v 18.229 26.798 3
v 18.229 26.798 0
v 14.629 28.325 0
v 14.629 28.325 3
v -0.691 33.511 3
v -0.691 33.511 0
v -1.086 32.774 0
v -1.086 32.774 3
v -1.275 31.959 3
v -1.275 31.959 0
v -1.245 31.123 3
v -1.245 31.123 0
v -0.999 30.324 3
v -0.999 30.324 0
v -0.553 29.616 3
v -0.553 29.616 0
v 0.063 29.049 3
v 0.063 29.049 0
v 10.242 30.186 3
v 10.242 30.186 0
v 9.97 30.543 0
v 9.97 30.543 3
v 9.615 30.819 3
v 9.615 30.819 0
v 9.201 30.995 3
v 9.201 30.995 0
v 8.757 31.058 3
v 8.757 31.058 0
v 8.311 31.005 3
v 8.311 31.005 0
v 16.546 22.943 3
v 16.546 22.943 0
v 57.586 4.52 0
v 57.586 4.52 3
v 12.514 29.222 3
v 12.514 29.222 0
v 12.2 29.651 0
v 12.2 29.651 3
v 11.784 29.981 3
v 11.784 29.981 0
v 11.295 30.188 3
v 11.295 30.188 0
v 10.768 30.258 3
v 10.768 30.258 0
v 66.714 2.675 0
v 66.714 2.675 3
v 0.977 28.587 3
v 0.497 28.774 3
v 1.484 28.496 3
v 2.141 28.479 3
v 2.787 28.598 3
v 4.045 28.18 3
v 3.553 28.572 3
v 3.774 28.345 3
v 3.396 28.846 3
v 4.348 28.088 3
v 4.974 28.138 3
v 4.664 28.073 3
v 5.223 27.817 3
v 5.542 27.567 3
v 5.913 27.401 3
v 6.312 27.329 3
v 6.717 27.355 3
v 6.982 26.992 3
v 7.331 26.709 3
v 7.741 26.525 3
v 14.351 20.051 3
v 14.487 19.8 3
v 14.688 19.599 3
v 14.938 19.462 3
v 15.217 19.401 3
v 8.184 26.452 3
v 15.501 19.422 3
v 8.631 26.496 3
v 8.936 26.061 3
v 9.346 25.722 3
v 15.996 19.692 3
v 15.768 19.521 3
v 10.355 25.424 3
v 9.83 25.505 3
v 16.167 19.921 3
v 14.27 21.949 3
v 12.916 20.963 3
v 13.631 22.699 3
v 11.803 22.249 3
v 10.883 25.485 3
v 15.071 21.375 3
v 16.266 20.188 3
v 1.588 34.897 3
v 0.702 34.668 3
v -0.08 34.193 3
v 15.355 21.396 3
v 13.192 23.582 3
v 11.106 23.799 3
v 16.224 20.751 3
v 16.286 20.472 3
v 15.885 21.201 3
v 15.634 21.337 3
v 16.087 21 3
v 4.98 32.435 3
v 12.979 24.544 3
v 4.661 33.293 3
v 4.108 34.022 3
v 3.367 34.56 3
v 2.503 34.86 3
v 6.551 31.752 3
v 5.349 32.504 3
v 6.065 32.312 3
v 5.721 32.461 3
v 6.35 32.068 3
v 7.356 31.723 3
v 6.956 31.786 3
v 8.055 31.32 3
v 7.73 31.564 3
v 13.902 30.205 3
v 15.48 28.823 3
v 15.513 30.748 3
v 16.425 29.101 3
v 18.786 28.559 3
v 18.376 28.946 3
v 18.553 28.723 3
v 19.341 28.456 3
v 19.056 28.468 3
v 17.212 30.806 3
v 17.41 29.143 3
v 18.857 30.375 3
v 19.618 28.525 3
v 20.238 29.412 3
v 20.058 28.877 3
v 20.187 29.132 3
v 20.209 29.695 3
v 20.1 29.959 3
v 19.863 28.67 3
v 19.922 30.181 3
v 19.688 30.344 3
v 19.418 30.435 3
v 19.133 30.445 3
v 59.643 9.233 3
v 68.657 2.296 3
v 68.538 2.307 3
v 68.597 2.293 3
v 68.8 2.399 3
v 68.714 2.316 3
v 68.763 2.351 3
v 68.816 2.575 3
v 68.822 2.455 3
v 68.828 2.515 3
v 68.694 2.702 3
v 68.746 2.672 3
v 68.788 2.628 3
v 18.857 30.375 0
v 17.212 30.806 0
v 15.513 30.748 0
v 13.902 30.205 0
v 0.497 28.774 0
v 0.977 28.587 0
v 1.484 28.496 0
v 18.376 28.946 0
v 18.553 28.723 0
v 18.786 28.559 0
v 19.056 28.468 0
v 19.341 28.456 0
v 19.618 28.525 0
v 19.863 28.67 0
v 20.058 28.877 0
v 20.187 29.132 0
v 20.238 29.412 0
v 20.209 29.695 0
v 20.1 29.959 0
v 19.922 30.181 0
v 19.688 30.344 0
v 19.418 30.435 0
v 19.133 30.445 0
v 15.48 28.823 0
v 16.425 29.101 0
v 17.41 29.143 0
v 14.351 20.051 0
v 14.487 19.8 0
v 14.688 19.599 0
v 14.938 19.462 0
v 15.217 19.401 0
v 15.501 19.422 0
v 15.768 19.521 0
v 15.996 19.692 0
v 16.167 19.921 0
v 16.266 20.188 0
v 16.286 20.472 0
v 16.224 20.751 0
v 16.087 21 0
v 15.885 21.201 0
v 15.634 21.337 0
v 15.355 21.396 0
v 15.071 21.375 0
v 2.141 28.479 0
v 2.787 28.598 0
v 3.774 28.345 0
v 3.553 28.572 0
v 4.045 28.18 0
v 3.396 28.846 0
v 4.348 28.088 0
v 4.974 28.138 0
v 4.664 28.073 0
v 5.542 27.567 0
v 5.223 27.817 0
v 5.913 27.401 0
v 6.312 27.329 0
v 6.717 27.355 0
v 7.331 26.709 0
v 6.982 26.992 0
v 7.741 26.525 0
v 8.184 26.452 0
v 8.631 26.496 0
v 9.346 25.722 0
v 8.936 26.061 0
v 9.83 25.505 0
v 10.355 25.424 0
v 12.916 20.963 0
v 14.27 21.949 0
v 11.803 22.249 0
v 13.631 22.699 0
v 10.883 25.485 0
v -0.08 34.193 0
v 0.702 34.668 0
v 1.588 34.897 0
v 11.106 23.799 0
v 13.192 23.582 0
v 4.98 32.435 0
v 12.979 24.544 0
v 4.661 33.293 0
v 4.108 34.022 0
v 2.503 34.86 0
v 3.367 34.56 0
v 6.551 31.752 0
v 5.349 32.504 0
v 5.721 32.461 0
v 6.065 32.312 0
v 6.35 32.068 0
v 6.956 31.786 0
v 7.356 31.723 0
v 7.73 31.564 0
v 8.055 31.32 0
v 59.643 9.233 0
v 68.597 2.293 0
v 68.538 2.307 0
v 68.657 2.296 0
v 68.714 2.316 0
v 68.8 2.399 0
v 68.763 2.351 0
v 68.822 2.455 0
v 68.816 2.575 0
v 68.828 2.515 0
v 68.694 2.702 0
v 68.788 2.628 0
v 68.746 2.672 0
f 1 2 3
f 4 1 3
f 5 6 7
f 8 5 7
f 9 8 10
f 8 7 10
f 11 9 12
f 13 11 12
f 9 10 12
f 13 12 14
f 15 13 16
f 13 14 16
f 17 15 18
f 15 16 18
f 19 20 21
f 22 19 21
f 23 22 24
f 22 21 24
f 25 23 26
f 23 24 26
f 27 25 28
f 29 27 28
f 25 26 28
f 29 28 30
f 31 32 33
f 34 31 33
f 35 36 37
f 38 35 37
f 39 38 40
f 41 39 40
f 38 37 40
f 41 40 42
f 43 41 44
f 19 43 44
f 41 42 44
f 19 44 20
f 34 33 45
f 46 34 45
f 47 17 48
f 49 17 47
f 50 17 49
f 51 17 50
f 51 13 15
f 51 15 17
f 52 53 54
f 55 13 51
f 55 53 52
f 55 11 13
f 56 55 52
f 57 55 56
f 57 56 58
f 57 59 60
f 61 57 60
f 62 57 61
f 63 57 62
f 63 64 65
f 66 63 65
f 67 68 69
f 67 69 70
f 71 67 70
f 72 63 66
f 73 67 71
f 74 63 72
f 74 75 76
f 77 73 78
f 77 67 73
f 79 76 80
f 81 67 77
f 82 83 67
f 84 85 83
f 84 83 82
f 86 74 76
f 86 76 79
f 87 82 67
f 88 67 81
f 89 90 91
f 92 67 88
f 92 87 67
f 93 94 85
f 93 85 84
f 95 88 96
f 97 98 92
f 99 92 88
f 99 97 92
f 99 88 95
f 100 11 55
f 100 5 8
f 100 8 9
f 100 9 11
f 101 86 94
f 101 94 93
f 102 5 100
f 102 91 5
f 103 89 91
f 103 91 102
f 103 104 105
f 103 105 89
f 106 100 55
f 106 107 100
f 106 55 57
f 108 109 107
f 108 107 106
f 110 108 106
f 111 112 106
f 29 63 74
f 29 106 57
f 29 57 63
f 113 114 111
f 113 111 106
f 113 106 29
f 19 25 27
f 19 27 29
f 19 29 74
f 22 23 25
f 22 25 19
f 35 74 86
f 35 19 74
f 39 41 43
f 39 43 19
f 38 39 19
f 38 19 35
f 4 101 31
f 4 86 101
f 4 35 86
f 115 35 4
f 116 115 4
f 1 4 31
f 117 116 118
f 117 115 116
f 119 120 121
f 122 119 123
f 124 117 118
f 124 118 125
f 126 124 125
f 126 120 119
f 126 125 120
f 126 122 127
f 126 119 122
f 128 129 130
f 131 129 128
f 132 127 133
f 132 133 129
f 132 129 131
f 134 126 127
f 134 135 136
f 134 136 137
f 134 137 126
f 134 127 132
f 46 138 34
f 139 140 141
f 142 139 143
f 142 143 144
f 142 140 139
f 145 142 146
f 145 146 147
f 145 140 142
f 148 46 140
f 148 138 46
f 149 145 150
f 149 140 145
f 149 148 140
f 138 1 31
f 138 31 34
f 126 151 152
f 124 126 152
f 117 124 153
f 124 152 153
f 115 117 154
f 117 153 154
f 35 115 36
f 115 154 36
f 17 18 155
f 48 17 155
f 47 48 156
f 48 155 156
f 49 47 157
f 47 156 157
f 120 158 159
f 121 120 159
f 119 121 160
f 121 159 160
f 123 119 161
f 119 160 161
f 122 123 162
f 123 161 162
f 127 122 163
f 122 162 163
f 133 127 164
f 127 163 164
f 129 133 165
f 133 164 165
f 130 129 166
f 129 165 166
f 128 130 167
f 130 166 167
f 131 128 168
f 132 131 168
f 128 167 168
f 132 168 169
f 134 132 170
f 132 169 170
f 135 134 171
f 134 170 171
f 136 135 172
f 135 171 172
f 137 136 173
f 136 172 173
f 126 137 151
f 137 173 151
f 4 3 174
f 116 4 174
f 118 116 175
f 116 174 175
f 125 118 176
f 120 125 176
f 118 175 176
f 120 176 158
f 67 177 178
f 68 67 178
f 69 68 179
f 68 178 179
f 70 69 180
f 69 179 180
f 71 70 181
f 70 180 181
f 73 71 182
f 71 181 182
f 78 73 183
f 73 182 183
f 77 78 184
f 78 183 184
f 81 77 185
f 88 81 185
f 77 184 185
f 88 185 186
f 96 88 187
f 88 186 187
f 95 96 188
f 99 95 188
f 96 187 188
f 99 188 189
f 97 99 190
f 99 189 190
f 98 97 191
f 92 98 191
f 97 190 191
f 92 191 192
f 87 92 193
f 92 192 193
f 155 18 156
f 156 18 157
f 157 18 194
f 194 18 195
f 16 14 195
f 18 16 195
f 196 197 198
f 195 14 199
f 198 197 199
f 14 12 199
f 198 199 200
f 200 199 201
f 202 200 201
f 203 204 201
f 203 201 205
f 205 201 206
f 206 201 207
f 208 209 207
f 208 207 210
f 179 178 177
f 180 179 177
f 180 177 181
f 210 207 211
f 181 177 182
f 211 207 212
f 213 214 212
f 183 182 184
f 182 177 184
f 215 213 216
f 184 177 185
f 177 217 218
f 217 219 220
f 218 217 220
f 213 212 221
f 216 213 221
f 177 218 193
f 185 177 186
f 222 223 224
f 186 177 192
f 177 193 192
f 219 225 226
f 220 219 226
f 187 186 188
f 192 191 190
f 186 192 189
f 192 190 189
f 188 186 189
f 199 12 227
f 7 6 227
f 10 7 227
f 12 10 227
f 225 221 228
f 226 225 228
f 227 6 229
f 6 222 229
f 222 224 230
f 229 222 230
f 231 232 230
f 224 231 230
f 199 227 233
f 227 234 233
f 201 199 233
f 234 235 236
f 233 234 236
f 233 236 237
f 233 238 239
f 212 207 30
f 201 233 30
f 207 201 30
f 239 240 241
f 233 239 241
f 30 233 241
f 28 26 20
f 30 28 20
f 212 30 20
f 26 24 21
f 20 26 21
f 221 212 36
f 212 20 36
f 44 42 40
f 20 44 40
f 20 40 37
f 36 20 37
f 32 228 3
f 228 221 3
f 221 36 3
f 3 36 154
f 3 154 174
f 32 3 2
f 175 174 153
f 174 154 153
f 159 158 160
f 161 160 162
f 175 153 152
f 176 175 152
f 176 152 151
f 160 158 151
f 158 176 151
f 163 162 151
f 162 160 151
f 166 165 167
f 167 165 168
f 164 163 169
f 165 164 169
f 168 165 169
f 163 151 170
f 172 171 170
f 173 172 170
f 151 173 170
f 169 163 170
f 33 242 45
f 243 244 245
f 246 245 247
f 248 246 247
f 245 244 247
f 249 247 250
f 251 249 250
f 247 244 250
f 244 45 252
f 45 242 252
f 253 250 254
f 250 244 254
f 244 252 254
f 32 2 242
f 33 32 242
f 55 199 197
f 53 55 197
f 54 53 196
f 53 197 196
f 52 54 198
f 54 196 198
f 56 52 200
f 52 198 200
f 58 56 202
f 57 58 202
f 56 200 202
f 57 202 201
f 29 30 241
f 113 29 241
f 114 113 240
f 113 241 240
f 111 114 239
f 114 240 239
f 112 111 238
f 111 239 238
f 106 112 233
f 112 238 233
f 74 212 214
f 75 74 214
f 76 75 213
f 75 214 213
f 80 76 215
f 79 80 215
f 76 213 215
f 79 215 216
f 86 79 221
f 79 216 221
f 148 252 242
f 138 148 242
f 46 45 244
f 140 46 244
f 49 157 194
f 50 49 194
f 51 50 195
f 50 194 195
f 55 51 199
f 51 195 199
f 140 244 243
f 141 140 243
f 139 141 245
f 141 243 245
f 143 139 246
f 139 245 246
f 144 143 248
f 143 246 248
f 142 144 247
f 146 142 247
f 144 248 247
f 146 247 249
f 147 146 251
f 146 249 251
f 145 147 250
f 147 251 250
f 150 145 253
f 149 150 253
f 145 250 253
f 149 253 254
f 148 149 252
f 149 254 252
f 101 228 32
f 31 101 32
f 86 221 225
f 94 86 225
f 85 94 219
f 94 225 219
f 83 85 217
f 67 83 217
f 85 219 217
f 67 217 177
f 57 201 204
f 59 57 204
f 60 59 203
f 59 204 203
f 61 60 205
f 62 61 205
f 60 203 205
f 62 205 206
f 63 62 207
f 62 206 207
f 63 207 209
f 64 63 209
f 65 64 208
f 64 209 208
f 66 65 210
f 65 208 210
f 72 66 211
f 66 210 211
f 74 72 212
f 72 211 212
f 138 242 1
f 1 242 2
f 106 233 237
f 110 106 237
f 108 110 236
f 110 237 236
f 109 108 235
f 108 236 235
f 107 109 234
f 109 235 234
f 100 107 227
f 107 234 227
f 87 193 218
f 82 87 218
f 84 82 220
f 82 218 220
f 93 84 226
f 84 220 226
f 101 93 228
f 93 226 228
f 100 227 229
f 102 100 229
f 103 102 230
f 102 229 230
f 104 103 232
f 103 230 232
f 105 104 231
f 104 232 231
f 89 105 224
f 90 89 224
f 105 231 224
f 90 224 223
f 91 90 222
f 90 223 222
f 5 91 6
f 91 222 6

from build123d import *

# Parameters (mm, degrees)
SALIENTE_EXTRUIR1_DEPTH = 3


with BuildPart() as part:
    # Model → Saliente-Extruir1 (new body)
    with BuildSketch(Plane.XY):
        with BuildLine():
            Line((66.714016933, 2.675368226), (68.538077011, 2.306726339))
            ThreePointArc((68.538077011, 2.306726339), (68.813397969, 2.426362589), (68.69376172, 2.701683548))
            Line((68.69376172, 2.701683548), (59.642778757, 9.23296694))
            Line((59.642778757, 9.23296694), (18.229236322, 26.798350869))
            Line((18.229236322, 26.798350869), (14.628932536, 28.325404932))
            ThreePointArc((14.628932536, 28.325404932), (16.425259576, 29.101436048), (18.375877707, 28.946181294))
            ThreePointArc((18.375877707, 28.946181294), (20.18694444, 29.13171328), (18.856885424, 30.37482544))
            ThreePointArc((18.856885424, 30.37482544), (15.51300149, 30.748167733), (12.514190479, 29.22236409))
            ThreePointArc((12.514190479, 29.22236409), (11.546461676, 30.101035899), (10.242109559, 30.186057881))
            ThreePointArc((10.242109559, 30.186057881), (9.413998041, 30.920271825), (8.310546545, 31.005322399))
            ThreePointArc((8.310546545, 31.005322399), (7.548095898, 31.654909282), (6.551125432, 31.751573638))
            ThreePointArc((6.551125432, 31.751573638), (5.898852104, 32.399314767), (4.980282277, 32.434790623))
            ThreePointArc((4.980282277, 32.434790623), (2.50269425, 34.859987429), (-0.691279819, 33.511450585))
            ThreePointArc((-0.691279819, 33.511450585), (-1.245238827, 31.123095112), (0.062521474, 29.0492399))
            ThreePointArc((0.062521474, 29.0492399), (0.732684306, 28.668767636), (1.483760549, 28.496251432))
            ThreePointArc((1.483760549, 28.496251432), (2.467023265, 28.521711274), (3.395589179, 28.846086231))
            ThreePointArc((3.395589179, 28.846086231), (4.04475241, 28.180155342), (4.973767828, 28.137644119))
            ThreePointArc((4.973767828, 28.137644119), (5.722549371, 27.472346961), (6.71729481, 27.354977378))
            ThreePointArc((6.71729481, 27.354977378), (7.529963713, 26.603706418), (8.63140861, 26.495734463))
            ThreePointArc((8.63140861, 26.495734463), (9.580661475, 25.59713434), (10.88296417, 25.485014428))
            ThreePointArc((10.88296417, 25.485014428), (11.803253278, 22.248656569), (14.350721609, 20.050623508))
            ThreePointArc((14.350721609, 20.050623508), (16.16662002, 19.920632003), (15.071202926, 21.374745554))
            ThreePointArc((15.071202926, 21.374745554), (13.631015332, 22.699462439), (12.978602224, 24.544285537))
            Line((12.978602224, 24.544285537), (16.546381847, 22.942714426))
            Line((16.546381847, 22.942714426), (57.585805628, 4.520176455))
            Line((57.585805628, 4.520176455), (66.714016933, 2.675368226))
        make_face()
    extrude(amount=SALIENTE_EXTRUIR1_DEPTH)


solid = part.part
